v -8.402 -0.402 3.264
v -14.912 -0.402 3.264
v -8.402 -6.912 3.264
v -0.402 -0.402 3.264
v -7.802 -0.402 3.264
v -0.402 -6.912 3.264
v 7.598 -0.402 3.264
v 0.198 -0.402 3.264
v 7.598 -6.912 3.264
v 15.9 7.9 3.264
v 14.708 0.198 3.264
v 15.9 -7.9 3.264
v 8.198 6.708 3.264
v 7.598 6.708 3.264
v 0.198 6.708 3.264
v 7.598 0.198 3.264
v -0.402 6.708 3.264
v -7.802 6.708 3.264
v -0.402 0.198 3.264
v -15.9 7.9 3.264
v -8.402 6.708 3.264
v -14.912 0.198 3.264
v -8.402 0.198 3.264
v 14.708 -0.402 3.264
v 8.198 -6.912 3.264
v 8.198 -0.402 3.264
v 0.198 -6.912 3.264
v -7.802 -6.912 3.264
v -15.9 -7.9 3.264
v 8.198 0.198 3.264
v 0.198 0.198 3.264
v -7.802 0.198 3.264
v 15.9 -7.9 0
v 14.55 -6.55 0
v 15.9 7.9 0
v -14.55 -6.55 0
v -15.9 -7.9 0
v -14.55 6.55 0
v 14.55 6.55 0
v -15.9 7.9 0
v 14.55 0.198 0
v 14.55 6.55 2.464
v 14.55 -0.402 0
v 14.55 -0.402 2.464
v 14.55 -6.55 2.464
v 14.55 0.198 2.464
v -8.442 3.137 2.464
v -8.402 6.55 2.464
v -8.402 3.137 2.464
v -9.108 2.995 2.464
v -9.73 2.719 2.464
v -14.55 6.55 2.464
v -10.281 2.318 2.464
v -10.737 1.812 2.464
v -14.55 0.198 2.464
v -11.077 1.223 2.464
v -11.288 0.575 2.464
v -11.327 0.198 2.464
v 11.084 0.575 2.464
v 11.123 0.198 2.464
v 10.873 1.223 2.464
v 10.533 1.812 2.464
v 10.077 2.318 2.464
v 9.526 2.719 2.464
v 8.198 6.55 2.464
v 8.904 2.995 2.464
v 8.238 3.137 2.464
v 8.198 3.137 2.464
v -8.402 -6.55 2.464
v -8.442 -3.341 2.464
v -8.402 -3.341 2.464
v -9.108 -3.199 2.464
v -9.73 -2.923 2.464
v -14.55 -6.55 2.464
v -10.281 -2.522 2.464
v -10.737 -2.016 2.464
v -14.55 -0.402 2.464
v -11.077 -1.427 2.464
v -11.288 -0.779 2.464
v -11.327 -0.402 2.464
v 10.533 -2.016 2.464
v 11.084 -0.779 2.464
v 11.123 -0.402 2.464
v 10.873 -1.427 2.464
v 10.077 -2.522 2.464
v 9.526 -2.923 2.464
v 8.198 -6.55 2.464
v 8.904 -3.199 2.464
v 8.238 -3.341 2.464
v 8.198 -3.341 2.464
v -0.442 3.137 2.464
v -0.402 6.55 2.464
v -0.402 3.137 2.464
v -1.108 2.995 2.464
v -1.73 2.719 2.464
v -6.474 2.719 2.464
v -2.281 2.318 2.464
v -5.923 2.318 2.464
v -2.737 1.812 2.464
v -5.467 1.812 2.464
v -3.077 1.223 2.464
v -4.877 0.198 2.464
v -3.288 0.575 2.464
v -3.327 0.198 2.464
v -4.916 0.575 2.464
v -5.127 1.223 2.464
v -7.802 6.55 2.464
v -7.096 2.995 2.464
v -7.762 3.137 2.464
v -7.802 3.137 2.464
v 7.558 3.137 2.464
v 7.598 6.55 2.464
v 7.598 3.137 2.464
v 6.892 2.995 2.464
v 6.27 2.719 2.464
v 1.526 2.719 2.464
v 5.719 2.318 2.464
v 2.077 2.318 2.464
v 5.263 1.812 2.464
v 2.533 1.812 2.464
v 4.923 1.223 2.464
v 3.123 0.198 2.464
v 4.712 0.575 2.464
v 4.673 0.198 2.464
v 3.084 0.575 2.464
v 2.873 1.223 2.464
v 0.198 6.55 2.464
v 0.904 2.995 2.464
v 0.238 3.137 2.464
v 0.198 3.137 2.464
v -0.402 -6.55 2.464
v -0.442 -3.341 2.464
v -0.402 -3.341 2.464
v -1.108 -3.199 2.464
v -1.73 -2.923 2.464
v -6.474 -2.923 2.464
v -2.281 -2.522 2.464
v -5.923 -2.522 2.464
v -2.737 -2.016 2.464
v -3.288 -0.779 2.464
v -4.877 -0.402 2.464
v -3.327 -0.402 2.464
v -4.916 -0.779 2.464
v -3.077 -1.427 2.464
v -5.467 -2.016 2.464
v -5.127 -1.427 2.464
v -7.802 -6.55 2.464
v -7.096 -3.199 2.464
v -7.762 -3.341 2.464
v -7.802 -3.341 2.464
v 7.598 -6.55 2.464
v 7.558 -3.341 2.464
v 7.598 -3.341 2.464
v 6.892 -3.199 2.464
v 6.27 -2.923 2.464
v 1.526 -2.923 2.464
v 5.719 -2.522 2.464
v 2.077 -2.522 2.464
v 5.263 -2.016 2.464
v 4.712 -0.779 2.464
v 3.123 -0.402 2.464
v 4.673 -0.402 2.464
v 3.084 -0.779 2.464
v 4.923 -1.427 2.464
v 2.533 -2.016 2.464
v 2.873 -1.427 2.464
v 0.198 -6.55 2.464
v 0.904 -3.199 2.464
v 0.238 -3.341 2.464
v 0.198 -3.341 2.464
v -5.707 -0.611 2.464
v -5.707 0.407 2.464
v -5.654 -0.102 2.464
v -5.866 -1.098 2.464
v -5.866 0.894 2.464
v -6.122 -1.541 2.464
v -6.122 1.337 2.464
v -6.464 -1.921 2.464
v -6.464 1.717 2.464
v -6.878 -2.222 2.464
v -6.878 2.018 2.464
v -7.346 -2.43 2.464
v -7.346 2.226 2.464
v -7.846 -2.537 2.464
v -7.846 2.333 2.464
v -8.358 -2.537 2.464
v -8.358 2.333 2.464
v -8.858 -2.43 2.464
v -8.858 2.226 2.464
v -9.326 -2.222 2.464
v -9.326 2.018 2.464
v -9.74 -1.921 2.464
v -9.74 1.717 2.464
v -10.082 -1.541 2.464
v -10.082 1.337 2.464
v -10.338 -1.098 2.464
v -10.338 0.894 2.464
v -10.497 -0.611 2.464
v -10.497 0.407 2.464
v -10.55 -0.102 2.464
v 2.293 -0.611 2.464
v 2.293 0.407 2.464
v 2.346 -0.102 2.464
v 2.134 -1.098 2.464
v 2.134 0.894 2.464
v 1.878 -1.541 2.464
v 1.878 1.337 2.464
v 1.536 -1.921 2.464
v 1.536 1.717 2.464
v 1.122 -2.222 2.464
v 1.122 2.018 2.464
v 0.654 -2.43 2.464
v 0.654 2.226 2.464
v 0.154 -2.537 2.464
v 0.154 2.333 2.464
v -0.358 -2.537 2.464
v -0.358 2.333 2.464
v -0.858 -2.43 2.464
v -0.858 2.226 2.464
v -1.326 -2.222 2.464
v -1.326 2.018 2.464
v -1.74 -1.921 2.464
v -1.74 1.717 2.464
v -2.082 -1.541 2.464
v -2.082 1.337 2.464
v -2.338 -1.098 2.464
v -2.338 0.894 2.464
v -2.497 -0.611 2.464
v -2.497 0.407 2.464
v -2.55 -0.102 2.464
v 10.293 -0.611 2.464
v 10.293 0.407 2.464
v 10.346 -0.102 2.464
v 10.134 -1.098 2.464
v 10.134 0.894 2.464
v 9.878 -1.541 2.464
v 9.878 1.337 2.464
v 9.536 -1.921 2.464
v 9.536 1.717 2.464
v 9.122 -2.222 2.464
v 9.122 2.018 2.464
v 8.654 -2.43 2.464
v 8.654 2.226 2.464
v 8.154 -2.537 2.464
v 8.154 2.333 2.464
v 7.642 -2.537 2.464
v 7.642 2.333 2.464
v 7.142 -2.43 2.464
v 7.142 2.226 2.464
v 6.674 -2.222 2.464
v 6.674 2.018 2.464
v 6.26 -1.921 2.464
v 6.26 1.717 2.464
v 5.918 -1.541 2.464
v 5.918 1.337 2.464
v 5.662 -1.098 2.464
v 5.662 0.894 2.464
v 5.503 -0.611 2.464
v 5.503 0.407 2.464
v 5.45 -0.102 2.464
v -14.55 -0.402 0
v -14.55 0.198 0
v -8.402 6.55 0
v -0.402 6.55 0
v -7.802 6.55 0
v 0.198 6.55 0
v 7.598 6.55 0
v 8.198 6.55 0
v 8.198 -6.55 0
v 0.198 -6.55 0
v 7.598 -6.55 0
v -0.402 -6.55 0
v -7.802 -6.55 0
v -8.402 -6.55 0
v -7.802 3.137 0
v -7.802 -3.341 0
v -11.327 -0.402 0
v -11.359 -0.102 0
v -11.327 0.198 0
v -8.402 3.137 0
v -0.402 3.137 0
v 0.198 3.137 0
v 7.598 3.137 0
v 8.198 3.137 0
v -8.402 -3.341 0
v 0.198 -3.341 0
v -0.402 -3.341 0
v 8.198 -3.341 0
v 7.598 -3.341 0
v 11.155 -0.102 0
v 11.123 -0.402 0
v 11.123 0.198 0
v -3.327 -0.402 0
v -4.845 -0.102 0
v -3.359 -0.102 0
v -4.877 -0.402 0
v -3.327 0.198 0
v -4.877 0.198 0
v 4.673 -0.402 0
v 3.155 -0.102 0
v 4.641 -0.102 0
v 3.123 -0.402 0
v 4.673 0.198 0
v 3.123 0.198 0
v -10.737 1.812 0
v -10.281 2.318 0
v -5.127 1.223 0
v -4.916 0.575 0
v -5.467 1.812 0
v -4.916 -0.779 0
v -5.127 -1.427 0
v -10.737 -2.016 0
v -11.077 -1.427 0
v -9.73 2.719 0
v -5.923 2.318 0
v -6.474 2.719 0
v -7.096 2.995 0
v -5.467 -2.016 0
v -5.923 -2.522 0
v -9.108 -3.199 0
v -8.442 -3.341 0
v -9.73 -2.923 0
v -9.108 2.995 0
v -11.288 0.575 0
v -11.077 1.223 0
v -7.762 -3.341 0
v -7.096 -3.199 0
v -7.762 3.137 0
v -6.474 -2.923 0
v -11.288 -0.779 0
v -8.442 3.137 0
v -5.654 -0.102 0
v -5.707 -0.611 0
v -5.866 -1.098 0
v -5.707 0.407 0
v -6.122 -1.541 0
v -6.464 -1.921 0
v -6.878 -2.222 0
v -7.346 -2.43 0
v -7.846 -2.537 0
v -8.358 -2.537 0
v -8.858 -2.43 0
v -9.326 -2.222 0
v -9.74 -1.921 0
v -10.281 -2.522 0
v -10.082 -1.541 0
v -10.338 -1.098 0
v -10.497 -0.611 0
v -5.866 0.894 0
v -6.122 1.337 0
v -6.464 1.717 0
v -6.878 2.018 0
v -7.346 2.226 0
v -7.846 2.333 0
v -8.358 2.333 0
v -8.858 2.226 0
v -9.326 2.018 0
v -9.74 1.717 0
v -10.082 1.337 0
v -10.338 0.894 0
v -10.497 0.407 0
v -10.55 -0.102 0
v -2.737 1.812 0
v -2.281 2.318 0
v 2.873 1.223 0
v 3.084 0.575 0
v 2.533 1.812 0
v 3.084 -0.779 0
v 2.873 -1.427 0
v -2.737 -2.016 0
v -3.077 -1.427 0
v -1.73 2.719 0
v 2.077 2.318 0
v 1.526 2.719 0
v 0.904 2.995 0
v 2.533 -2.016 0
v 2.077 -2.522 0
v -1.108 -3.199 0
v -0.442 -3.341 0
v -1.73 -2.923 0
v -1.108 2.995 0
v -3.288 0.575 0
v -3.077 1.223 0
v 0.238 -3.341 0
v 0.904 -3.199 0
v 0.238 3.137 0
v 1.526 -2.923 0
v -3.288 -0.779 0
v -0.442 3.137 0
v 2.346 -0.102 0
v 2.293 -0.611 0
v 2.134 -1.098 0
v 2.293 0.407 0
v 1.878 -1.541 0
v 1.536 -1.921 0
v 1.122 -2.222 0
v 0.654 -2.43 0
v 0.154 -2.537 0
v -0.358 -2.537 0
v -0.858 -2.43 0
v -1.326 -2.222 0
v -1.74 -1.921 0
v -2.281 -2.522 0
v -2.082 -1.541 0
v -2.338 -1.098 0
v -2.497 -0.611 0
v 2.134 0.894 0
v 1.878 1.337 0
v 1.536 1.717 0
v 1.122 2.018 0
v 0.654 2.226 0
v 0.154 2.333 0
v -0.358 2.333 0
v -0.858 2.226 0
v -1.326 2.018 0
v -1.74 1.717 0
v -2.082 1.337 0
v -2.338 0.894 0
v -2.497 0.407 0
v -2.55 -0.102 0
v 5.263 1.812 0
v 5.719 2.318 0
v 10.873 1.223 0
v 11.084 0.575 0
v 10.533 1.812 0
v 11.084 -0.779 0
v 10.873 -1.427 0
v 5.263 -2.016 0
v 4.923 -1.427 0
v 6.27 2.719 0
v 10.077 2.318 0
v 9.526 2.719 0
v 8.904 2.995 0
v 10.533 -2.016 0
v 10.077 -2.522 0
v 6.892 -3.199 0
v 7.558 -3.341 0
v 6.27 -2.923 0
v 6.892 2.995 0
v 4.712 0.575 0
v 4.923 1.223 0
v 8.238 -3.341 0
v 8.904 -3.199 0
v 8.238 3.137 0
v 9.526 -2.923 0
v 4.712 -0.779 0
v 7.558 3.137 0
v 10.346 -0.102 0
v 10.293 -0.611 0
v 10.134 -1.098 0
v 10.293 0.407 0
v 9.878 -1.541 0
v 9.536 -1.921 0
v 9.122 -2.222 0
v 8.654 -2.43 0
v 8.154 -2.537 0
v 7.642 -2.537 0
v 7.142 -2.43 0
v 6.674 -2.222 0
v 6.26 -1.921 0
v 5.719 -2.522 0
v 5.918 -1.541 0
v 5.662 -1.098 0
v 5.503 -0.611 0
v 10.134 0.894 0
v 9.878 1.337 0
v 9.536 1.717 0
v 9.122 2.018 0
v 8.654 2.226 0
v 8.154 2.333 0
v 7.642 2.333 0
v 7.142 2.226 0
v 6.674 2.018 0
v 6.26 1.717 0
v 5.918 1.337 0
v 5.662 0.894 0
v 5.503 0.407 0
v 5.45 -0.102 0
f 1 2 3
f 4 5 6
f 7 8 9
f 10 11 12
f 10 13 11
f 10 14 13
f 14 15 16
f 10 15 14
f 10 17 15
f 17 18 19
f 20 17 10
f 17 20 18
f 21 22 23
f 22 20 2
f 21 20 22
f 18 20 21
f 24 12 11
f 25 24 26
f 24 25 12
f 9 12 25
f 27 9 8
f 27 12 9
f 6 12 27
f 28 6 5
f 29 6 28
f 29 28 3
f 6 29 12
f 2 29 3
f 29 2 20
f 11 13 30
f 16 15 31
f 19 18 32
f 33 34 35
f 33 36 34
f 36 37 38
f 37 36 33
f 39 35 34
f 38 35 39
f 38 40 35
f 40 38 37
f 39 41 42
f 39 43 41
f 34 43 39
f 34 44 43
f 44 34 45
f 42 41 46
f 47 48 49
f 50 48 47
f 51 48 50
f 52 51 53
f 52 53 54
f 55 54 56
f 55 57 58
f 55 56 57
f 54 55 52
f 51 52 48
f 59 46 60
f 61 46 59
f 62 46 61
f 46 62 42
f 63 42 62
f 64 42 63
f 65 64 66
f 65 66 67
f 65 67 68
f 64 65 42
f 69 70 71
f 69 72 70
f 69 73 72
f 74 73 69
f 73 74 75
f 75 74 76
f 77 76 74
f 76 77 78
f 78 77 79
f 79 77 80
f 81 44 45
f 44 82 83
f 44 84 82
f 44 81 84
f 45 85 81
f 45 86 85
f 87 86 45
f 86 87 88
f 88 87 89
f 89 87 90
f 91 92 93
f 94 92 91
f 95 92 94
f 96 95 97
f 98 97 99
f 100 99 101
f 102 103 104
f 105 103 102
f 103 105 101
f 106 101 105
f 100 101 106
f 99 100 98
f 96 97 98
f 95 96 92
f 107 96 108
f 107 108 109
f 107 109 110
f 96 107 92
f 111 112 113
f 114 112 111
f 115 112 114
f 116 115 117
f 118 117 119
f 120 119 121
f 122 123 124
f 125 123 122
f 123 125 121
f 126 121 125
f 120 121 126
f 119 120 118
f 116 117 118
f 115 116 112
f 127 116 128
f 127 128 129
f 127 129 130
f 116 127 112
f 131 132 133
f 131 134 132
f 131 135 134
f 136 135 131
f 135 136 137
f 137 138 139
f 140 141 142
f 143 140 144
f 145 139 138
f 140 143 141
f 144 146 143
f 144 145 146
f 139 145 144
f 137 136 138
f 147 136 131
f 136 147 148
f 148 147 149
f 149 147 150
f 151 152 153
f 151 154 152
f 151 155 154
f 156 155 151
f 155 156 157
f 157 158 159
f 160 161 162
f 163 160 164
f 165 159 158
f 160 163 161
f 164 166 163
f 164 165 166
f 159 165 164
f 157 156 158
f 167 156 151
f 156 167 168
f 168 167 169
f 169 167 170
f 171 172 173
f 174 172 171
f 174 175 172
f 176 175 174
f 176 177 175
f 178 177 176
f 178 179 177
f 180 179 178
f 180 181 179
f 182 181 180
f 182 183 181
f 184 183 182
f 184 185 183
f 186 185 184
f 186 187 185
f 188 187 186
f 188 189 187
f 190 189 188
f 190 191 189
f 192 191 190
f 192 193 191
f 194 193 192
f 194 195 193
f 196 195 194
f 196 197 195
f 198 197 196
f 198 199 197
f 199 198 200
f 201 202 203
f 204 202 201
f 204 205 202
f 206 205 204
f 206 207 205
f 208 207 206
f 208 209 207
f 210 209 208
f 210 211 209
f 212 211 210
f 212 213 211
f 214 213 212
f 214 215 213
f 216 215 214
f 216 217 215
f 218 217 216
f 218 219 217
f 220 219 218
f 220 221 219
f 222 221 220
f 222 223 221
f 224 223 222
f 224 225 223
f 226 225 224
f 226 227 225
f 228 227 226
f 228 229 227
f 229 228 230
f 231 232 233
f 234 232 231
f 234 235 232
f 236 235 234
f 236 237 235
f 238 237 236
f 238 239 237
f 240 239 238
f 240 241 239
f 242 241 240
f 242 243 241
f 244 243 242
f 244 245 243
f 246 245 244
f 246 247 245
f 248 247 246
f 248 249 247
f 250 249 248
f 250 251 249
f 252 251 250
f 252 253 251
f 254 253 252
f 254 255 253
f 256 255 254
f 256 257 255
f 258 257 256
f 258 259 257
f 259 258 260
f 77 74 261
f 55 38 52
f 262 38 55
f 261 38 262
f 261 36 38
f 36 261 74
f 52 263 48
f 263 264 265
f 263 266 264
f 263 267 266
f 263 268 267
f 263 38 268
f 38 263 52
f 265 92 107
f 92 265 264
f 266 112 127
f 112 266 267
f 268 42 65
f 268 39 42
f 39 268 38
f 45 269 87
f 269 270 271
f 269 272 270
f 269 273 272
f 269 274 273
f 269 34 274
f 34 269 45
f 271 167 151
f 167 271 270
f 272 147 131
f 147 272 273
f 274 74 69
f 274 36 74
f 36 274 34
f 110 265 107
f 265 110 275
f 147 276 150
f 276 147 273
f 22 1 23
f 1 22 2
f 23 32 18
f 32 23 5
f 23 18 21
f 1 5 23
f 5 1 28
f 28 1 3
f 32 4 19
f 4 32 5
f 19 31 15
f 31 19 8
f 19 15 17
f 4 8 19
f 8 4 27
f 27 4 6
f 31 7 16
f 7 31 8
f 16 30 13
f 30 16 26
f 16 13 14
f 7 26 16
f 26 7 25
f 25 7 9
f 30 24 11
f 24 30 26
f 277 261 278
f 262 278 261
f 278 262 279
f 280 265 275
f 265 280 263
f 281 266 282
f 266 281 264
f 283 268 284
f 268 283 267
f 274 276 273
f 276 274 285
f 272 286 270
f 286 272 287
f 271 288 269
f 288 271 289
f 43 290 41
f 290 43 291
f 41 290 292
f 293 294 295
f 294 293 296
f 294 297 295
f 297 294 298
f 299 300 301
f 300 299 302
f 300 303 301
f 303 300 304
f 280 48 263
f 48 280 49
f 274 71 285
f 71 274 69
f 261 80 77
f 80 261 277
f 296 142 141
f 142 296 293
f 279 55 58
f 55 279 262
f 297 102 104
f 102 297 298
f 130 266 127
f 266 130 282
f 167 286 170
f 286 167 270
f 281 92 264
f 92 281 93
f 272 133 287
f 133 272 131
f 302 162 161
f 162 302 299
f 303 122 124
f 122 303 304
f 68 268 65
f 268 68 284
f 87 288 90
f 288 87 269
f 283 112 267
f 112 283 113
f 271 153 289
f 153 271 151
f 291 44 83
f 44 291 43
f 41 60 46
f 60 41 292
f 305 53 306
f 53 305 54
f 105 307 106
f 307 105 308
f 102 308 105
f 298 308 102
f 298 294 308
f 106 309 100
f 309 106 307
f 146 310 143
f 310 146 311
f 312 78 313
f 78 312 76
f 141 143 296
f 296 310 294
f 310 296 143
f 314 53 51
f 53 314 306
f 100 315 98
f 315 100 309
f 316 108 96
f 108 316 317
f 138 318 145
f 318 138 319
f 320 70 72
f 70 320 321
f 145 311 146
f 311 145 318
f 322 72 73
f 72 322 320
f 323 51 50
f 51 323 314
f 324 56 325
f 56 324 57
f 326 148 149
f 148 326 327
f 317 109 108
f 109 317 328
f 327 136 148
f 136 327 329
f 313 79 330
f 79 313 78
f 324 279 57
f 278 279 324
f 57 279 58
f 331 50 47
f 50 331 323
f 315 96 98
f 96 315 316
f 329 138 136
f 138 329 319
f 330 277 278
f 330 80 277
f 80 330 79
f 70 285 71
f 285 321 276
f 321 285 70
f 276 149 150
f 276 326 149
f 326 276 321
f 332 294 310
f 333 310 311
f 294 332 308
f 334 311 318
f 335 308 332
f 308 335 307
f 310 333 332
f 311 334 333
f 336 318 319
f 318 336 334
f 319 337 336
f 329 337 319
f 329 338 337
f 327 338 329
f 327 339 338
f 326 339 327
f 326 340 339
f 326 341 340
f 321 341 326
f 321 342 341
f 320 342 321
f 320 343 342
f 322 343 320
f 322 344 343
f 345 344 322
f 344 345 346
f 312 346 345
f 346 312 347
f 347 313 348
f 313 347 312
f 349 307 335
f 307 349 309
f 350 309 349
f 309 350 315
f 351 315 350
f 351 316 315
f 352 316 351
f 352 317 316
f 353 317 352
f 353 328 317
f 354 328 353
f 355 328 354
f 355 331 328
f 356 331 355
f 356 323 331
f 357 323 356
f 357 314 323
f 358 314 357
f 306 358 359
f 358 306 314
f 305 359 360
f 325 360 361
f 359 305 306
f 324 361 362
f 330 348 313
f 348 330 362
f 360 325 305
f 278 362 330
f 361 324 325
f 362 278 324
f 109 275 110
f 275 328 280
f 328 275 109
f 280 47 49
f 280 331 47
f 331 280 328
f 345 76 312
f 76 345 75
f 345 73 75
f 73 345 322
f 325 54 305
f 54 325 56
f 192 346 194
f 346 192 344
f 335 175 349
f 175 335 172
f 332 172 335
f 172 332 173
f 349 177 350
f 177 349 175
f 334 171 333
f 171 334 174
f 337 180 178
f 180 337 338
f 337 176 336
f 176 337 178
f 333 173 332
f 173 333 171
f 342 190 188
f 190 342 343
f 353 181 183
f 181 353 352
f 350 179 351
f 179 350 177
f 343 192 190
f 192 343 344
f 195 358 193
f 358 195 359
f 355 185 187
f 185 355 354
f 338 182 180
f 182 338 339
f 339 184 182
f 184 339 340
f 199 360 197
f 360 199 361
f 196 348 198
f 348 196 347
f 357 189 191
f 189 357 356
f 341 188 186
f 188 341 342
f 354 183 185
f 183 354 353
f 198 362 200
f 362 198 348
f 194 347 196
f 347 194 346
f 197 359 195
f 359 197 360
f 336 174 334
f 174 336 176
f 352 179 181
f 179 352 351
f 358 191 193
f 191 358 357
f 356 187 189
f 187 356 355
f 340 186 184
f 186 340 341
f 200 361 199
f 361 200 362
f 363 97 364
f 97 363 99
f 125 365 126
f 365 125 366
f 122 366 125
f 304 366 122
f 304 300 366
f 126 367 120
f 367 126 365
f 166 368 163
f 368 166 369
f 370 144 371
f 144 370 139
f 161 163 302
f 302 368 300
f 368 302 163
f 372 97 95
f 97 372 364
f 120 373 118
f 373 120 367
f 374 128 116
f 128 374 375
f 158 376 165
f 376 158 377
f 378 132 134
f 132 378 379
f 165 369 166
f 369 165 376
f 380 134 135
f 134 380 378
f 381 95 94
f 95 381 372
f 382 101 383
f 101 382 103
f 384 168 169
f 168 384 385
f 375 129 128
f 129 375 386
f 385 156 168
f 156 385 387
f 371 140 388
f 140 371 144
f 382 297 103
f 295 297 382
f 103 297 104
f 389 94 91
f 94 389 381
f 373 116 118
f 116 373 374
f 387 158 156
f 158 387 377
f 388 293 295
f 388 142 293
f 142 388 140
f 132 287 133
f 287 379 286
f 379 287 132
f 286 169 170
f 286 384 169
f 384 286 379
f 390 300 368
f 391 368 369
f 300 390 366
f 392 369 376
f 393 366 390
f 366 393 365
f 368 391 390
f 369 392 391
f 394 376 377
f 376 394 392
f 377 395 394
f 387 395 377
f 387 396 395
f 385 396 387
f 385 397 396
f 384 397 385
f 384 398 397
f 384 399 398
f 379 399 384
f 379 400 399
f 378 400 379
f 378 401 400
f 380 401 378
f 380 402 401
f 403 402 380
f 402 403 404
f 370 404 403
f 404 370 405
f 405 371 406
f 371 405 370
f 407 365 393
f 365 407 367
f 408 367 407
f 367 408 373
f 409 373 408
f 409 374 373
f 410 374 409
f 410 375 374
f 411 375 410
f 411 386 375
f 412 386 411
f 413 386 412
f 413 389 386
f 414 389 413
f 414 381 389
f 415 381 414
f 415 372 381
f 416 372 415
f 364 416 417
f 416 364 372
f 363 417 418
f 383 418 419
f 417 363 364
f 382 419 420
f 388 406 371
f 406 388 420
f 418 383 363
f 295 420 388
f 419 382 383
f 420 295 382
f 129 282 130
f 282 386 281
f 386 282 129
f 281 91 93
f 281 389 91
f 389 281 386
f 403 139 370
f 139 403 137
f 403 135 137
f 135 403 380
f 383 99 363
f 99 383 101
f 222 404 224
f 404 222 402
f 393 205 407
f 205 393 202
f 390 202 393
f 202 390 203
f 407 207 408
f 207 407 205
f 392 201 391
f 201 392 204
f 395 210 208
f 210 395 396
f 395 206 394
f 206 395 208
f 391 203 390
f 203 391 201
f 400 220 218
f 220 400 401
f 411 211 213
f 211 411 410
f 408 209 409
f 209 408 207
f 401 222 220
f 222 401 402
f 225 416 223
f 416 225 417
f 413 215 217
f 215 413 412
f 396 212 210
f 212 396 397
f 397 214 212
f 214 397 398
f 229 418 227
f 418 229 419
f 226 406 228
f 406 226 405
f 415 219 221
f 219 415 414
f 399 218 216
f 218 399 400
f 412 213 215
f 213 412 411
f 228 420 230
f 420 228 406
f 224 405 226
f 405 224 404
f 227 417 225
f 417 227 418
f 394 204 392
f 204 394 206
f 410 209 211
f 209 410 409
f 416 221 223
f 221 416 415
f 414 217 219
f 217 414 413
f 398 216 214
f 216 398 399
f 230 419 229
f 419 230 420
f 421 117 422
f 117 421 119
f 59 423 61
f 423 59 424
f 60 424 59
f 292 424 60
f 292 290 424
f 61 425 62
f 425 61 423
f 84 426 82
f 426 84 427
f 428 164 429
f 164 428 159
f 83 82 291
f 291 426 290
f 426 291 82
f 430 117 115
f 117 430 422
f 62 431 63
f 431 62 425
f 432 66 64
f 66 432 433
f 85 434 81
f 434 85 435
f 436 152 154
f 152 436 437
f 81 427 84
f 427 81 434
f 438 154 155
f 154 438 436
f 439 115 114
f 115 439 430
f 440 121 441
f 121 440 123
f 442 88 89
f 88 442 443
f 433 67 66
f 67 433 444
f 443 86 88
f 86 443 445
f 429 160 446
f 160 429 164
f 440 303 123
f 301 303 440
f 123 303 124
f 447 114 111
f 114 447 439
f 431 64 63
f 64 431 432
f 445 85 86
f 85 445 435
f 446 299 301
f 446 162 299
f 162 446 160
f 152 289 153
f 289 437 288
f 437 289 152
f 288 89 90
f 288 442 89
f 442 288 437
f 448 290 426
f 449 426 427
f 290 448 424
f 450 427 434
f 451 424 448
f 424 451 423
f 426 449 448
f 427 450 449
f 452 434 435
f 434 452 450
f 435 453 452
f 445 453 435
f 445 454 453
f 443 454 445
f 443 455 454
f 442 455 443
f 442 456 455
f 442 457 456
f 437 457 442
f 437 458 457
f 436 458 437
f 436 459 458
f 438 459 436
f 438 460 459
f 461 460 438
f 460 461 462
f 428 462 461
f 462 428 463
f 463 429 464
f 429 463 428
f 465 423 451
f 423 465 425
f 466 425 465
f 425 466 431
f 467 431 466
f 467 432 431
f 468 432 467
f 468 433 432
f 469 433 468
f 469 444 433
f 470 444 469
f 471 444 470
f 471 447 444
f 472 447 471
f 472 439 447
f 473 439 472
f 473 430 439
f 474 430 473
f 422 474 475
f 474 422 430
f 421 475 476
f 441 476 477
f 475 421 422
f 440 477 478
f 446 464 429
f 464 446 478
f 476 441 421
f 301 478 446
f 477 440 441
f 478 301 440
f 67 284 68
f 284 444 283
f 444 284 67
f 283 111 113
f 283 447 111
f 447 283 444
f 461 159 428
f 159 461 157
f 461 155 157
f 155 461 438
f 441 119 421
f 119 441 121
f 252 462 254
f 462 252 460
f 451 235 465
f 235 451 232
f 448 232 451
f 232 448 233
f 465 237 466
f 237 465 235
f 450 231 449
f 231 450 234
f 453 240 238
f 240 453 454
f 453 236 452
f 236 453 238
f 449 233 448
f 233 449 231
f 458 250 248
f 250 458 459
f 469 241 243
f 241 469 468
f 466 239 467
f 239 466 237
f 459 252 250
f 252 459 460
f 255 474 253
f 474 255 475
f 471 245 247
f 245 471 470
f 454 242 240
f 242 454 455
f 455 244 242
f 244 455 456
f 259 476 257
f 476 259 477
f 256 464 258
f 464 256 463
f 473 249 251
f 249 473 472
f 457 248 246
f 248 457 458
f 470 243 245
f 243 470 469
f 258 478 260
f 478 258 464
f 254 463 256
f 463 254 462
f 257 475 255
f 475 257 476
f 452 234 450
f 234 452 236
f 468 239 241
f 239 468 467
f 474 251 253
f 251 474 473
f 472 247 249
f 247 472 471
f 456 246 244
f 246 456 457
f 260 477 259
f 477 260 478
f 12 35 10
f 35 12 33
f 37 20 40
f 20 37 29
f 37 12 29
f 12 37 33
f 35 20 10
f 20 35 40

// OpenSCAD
// * LEGO®, the LEGO® logo, the Brick, DUPLO®, and MINDSTORMS® are trademarks of the LEGO® Group. ©2012 The LEGO® Group.
 //

/* [General] */

// Width of the block, in studs
block_width = 2;

// Length of the block, in studs
block_length = 4;

//Do you want the flexible grooves?
Grooves =false; //true or false

// What type of tape should this be? Stud or tile? (Stud is top side only & Tile is bottom side of lego only)
block_type = 0; // [1 = stud tape, 0 = tile tape]



// Height of the block. A ratio of "1" is a standard LEGO brick height; a ratio of "1/3" is a standard LEGO plate height; "1/2" is a standard DUPLO plate.
//RECOMENDED: Use 0.1 for stud tape and .34 for tile tape. This is left as user editible in case your filament is more/less flexible than mine. 
//Tring .25mm for 7x7 hard top for cuitcuit cover, .3 thick for chassis
    block_height_ratio = .34; // [.33333333333:1/3, .5:1/2, 1:1, 2:2, 3:3, 4:4, 5:5, 6:6, 7:7, 8:8, 9:9, 10:10]

/* Hidden */



knob_diameter=4.896*1.0;		//knobs on top of blocks

knob_height=1.8;
knob_spacing=8.0;
wall_thickness=1.45;
roof_thickness=.800;
block_height=9.6*block_height_ratio;
pin_diameter=3.2*1.00;		//pin for bottom blocks with width or length of 1
post_diameter=6.5137;
reinforcing_width=.6;
axle_spline_width=2.0;
axle_diameter=5;
cylinder_precision=0.05;
overall_length=block_length*8;
overall_width=block_width*8;
    
difference(){
    block(block_width ,block_length,1,axle_hole=false,reinforcement=true);
    if (Grooves == true) {
    grooves();
    }
    
       //These translated cubes cut out .1mm form the ends of each side of the brick for clearance to the next brick.
    translate([block_length*knob_spacing/2,0,0]){
        cube([.2,8*block_width+.01,block_height*2.01], center = true);
    }
     translate([-block_length*knob_spacing/2,0,0]){
        cube([.2,8*block_width+.01,block_height*2.01], center = true);
    }
     translate([0,-block_width*knob_spacing/2,0]){
        cube([8*block_length+.01,.2,block_height*2.01], center = true);
    }
     translate([0,block_width*knob_spacing/2,0]){
        cube([8*block_length+.01,.2,block_height*2.01], center = true);
    }
}
                

module grooves(height){
        	translate([-overall_length/2,-overall_width/2-.01,0]) {              
        for (ycount=[1:block_width-1]){
							for (xcount=[1:block_length-1]) {	
                                translate([xcount*knob_spacing,block_width*knob_spacing/2,block_height-1.5/4+.01]){
                                cube([.75,block_width*knob_spacing,1.5/2], center = true); 
                                    //y axisgrooves
                                } 
                                translate([block_length*knob_spacing/2,ycount*knob_spacing,block_height-1.5/4+.01]){
                                cube([block_length*knob_spacing,.75,1.5/2], center = true);
                                    //x axis grooves
                                   
                                }
                                
                            }
                        }
                    }
                }
                
                
module block(width,length,height,axle_hole,reinforcement) {
    //overall_length=(length-1)*knob_spacing+knob_diameter/stud_rescale+wall_thickness*2;
	//overall_width=(width-1)*knob_spacing+knob_diameter/stud_rescale+wall_thickness*2;
    overall_length=block_length*8;
    overall_width=block_width*8;
	start=(knob_diameter/2+knob_spacing/2+wall_thickness);
	translate([-overall_length/2,-overall_width/2,0])
		union() {
			difference() {
				union() {
					cube([overall_length,overall_width,height*block_height]);
					translate([knob_diameter/2+wall_thickness,knob_diameter/2+wall_thickness,0]) 
						for (ycount=[0:width-1])
							for (xcount=[0:length-1]) {	
                                translate([xcount*knob_spacing,ycount*knob_spacing,0])
                                cylinder(r=knob_diameter*block_type/2,h=block_height*height+knob_height,$fs=cylinder_precision);
						}
				}
				

                            
                if(block_type == 0){
                    translate([wall_thickness,wall_thickness,-roof_thickness]) cube([overall_length-wall_thickness*2,overall_width-wall_thickness*2,block_height*height]);
              						}
                    
				if (axle_hole==true)
					if (width>1 && length>1) for (ycount=[1:width-1])
						for (xcount=[1:length-1])
							translate([(xcount-1)*knob_spacing+start,(ycount-1)*knob_spacing+start,-block_height/2])  axle(height+1);
                        //grooves();
        
			}
	
			if (reinforcement==true && width>1 && length>1)
				difference() {
					for (ycount=[1:width-1])
						for (xcount=[1:length-1])
							translate([(xcount-1)*knob_spacing+start,(ycount-1)*knob_spacing+start,0]) reinforcement(height);
					for (ycount=[1:width-1])
						for (xcount=[1:length-1])
							translate([(xcount-1)*knob_spacing+start,(ycount-1)*knob_spacing+start,-0.5]) cylinder(r=post_diameter/2-0.1, h=height*block_height+0.5, $fs=cylinder_precision);
				}
	
			if (width>1 && length>1) for (ycount=[1:width-1])
				for (xcount=[1:length-1])
					translate([(xcount-1)*knob_spacing+start,(ycount-1)*knob_spacing+start,0]) post(height,axle_hole);
	
			if (width==1 && length!=1)
				for (xcount=[1:length-1])
					translate([(xcount-1)*knob_spacing+start,overall_width/2,0]) cylinder(r=pin_diameter/2,h=block_height*height,$fs=cylinder_precision);   
         
            if (width==1 && length!=1)
				for (xcount=[1:length-1])
					translate([(xcount-1)*knob_spacing+start,overall_width/2,block_height/2]) cube([reinforcing_width,7,height*block_height],center=true);     
  
         
			if (length==1 && width!=1)
				for (ycount=[1:width-1])
					translate([overall_length/2,(ycount-1)*knob_spacing+start,0]) cylinder(r=pin_diameter/2,h=block_height*height,$fs=cylinder_precision);
            if (length==1 && width!=1)
				for (ycount=[1:width-1])
                    translate([overall_length/2,(ycount-1)*knob_spacing+start,block_height/2]) cube([7,reinforcing_width,height*block_height],center=true);  

            }
}

module post(height,axle_hole=false) {
	difference() {
		cylinder(r=post_diameter/2, h=height*block_height,$fs=cylinder_precision);
		translate([0,0,-0.5])
            cylinder(r=knob_diameter/2, h=height*block_height+1,$fs=cylinder_precision);

	}
}

module reinforcement(height) {
	union() {
		translate([0,0,height*block_height/2]) union() {
			cube([reinforcing_width,knob_spacing+knob_diameter+wall_thickness/2,height*block_height],center=true);
			rotate(v=[0,0,1],a=90) cube([reinforcing_width,knob_spacing+knob_diameter+wall_thickness/2,height*block_height], center=true);
		}
	}
}


module axle(height) {
	translate([0,0,height*block_height/2]) union() {
		cube([axle_diameter,axle_spline_width,height*block_height],center=true);
		cube([axle_spline_width,axle_diameter,height*block_height],center=true);
	}
}
			
